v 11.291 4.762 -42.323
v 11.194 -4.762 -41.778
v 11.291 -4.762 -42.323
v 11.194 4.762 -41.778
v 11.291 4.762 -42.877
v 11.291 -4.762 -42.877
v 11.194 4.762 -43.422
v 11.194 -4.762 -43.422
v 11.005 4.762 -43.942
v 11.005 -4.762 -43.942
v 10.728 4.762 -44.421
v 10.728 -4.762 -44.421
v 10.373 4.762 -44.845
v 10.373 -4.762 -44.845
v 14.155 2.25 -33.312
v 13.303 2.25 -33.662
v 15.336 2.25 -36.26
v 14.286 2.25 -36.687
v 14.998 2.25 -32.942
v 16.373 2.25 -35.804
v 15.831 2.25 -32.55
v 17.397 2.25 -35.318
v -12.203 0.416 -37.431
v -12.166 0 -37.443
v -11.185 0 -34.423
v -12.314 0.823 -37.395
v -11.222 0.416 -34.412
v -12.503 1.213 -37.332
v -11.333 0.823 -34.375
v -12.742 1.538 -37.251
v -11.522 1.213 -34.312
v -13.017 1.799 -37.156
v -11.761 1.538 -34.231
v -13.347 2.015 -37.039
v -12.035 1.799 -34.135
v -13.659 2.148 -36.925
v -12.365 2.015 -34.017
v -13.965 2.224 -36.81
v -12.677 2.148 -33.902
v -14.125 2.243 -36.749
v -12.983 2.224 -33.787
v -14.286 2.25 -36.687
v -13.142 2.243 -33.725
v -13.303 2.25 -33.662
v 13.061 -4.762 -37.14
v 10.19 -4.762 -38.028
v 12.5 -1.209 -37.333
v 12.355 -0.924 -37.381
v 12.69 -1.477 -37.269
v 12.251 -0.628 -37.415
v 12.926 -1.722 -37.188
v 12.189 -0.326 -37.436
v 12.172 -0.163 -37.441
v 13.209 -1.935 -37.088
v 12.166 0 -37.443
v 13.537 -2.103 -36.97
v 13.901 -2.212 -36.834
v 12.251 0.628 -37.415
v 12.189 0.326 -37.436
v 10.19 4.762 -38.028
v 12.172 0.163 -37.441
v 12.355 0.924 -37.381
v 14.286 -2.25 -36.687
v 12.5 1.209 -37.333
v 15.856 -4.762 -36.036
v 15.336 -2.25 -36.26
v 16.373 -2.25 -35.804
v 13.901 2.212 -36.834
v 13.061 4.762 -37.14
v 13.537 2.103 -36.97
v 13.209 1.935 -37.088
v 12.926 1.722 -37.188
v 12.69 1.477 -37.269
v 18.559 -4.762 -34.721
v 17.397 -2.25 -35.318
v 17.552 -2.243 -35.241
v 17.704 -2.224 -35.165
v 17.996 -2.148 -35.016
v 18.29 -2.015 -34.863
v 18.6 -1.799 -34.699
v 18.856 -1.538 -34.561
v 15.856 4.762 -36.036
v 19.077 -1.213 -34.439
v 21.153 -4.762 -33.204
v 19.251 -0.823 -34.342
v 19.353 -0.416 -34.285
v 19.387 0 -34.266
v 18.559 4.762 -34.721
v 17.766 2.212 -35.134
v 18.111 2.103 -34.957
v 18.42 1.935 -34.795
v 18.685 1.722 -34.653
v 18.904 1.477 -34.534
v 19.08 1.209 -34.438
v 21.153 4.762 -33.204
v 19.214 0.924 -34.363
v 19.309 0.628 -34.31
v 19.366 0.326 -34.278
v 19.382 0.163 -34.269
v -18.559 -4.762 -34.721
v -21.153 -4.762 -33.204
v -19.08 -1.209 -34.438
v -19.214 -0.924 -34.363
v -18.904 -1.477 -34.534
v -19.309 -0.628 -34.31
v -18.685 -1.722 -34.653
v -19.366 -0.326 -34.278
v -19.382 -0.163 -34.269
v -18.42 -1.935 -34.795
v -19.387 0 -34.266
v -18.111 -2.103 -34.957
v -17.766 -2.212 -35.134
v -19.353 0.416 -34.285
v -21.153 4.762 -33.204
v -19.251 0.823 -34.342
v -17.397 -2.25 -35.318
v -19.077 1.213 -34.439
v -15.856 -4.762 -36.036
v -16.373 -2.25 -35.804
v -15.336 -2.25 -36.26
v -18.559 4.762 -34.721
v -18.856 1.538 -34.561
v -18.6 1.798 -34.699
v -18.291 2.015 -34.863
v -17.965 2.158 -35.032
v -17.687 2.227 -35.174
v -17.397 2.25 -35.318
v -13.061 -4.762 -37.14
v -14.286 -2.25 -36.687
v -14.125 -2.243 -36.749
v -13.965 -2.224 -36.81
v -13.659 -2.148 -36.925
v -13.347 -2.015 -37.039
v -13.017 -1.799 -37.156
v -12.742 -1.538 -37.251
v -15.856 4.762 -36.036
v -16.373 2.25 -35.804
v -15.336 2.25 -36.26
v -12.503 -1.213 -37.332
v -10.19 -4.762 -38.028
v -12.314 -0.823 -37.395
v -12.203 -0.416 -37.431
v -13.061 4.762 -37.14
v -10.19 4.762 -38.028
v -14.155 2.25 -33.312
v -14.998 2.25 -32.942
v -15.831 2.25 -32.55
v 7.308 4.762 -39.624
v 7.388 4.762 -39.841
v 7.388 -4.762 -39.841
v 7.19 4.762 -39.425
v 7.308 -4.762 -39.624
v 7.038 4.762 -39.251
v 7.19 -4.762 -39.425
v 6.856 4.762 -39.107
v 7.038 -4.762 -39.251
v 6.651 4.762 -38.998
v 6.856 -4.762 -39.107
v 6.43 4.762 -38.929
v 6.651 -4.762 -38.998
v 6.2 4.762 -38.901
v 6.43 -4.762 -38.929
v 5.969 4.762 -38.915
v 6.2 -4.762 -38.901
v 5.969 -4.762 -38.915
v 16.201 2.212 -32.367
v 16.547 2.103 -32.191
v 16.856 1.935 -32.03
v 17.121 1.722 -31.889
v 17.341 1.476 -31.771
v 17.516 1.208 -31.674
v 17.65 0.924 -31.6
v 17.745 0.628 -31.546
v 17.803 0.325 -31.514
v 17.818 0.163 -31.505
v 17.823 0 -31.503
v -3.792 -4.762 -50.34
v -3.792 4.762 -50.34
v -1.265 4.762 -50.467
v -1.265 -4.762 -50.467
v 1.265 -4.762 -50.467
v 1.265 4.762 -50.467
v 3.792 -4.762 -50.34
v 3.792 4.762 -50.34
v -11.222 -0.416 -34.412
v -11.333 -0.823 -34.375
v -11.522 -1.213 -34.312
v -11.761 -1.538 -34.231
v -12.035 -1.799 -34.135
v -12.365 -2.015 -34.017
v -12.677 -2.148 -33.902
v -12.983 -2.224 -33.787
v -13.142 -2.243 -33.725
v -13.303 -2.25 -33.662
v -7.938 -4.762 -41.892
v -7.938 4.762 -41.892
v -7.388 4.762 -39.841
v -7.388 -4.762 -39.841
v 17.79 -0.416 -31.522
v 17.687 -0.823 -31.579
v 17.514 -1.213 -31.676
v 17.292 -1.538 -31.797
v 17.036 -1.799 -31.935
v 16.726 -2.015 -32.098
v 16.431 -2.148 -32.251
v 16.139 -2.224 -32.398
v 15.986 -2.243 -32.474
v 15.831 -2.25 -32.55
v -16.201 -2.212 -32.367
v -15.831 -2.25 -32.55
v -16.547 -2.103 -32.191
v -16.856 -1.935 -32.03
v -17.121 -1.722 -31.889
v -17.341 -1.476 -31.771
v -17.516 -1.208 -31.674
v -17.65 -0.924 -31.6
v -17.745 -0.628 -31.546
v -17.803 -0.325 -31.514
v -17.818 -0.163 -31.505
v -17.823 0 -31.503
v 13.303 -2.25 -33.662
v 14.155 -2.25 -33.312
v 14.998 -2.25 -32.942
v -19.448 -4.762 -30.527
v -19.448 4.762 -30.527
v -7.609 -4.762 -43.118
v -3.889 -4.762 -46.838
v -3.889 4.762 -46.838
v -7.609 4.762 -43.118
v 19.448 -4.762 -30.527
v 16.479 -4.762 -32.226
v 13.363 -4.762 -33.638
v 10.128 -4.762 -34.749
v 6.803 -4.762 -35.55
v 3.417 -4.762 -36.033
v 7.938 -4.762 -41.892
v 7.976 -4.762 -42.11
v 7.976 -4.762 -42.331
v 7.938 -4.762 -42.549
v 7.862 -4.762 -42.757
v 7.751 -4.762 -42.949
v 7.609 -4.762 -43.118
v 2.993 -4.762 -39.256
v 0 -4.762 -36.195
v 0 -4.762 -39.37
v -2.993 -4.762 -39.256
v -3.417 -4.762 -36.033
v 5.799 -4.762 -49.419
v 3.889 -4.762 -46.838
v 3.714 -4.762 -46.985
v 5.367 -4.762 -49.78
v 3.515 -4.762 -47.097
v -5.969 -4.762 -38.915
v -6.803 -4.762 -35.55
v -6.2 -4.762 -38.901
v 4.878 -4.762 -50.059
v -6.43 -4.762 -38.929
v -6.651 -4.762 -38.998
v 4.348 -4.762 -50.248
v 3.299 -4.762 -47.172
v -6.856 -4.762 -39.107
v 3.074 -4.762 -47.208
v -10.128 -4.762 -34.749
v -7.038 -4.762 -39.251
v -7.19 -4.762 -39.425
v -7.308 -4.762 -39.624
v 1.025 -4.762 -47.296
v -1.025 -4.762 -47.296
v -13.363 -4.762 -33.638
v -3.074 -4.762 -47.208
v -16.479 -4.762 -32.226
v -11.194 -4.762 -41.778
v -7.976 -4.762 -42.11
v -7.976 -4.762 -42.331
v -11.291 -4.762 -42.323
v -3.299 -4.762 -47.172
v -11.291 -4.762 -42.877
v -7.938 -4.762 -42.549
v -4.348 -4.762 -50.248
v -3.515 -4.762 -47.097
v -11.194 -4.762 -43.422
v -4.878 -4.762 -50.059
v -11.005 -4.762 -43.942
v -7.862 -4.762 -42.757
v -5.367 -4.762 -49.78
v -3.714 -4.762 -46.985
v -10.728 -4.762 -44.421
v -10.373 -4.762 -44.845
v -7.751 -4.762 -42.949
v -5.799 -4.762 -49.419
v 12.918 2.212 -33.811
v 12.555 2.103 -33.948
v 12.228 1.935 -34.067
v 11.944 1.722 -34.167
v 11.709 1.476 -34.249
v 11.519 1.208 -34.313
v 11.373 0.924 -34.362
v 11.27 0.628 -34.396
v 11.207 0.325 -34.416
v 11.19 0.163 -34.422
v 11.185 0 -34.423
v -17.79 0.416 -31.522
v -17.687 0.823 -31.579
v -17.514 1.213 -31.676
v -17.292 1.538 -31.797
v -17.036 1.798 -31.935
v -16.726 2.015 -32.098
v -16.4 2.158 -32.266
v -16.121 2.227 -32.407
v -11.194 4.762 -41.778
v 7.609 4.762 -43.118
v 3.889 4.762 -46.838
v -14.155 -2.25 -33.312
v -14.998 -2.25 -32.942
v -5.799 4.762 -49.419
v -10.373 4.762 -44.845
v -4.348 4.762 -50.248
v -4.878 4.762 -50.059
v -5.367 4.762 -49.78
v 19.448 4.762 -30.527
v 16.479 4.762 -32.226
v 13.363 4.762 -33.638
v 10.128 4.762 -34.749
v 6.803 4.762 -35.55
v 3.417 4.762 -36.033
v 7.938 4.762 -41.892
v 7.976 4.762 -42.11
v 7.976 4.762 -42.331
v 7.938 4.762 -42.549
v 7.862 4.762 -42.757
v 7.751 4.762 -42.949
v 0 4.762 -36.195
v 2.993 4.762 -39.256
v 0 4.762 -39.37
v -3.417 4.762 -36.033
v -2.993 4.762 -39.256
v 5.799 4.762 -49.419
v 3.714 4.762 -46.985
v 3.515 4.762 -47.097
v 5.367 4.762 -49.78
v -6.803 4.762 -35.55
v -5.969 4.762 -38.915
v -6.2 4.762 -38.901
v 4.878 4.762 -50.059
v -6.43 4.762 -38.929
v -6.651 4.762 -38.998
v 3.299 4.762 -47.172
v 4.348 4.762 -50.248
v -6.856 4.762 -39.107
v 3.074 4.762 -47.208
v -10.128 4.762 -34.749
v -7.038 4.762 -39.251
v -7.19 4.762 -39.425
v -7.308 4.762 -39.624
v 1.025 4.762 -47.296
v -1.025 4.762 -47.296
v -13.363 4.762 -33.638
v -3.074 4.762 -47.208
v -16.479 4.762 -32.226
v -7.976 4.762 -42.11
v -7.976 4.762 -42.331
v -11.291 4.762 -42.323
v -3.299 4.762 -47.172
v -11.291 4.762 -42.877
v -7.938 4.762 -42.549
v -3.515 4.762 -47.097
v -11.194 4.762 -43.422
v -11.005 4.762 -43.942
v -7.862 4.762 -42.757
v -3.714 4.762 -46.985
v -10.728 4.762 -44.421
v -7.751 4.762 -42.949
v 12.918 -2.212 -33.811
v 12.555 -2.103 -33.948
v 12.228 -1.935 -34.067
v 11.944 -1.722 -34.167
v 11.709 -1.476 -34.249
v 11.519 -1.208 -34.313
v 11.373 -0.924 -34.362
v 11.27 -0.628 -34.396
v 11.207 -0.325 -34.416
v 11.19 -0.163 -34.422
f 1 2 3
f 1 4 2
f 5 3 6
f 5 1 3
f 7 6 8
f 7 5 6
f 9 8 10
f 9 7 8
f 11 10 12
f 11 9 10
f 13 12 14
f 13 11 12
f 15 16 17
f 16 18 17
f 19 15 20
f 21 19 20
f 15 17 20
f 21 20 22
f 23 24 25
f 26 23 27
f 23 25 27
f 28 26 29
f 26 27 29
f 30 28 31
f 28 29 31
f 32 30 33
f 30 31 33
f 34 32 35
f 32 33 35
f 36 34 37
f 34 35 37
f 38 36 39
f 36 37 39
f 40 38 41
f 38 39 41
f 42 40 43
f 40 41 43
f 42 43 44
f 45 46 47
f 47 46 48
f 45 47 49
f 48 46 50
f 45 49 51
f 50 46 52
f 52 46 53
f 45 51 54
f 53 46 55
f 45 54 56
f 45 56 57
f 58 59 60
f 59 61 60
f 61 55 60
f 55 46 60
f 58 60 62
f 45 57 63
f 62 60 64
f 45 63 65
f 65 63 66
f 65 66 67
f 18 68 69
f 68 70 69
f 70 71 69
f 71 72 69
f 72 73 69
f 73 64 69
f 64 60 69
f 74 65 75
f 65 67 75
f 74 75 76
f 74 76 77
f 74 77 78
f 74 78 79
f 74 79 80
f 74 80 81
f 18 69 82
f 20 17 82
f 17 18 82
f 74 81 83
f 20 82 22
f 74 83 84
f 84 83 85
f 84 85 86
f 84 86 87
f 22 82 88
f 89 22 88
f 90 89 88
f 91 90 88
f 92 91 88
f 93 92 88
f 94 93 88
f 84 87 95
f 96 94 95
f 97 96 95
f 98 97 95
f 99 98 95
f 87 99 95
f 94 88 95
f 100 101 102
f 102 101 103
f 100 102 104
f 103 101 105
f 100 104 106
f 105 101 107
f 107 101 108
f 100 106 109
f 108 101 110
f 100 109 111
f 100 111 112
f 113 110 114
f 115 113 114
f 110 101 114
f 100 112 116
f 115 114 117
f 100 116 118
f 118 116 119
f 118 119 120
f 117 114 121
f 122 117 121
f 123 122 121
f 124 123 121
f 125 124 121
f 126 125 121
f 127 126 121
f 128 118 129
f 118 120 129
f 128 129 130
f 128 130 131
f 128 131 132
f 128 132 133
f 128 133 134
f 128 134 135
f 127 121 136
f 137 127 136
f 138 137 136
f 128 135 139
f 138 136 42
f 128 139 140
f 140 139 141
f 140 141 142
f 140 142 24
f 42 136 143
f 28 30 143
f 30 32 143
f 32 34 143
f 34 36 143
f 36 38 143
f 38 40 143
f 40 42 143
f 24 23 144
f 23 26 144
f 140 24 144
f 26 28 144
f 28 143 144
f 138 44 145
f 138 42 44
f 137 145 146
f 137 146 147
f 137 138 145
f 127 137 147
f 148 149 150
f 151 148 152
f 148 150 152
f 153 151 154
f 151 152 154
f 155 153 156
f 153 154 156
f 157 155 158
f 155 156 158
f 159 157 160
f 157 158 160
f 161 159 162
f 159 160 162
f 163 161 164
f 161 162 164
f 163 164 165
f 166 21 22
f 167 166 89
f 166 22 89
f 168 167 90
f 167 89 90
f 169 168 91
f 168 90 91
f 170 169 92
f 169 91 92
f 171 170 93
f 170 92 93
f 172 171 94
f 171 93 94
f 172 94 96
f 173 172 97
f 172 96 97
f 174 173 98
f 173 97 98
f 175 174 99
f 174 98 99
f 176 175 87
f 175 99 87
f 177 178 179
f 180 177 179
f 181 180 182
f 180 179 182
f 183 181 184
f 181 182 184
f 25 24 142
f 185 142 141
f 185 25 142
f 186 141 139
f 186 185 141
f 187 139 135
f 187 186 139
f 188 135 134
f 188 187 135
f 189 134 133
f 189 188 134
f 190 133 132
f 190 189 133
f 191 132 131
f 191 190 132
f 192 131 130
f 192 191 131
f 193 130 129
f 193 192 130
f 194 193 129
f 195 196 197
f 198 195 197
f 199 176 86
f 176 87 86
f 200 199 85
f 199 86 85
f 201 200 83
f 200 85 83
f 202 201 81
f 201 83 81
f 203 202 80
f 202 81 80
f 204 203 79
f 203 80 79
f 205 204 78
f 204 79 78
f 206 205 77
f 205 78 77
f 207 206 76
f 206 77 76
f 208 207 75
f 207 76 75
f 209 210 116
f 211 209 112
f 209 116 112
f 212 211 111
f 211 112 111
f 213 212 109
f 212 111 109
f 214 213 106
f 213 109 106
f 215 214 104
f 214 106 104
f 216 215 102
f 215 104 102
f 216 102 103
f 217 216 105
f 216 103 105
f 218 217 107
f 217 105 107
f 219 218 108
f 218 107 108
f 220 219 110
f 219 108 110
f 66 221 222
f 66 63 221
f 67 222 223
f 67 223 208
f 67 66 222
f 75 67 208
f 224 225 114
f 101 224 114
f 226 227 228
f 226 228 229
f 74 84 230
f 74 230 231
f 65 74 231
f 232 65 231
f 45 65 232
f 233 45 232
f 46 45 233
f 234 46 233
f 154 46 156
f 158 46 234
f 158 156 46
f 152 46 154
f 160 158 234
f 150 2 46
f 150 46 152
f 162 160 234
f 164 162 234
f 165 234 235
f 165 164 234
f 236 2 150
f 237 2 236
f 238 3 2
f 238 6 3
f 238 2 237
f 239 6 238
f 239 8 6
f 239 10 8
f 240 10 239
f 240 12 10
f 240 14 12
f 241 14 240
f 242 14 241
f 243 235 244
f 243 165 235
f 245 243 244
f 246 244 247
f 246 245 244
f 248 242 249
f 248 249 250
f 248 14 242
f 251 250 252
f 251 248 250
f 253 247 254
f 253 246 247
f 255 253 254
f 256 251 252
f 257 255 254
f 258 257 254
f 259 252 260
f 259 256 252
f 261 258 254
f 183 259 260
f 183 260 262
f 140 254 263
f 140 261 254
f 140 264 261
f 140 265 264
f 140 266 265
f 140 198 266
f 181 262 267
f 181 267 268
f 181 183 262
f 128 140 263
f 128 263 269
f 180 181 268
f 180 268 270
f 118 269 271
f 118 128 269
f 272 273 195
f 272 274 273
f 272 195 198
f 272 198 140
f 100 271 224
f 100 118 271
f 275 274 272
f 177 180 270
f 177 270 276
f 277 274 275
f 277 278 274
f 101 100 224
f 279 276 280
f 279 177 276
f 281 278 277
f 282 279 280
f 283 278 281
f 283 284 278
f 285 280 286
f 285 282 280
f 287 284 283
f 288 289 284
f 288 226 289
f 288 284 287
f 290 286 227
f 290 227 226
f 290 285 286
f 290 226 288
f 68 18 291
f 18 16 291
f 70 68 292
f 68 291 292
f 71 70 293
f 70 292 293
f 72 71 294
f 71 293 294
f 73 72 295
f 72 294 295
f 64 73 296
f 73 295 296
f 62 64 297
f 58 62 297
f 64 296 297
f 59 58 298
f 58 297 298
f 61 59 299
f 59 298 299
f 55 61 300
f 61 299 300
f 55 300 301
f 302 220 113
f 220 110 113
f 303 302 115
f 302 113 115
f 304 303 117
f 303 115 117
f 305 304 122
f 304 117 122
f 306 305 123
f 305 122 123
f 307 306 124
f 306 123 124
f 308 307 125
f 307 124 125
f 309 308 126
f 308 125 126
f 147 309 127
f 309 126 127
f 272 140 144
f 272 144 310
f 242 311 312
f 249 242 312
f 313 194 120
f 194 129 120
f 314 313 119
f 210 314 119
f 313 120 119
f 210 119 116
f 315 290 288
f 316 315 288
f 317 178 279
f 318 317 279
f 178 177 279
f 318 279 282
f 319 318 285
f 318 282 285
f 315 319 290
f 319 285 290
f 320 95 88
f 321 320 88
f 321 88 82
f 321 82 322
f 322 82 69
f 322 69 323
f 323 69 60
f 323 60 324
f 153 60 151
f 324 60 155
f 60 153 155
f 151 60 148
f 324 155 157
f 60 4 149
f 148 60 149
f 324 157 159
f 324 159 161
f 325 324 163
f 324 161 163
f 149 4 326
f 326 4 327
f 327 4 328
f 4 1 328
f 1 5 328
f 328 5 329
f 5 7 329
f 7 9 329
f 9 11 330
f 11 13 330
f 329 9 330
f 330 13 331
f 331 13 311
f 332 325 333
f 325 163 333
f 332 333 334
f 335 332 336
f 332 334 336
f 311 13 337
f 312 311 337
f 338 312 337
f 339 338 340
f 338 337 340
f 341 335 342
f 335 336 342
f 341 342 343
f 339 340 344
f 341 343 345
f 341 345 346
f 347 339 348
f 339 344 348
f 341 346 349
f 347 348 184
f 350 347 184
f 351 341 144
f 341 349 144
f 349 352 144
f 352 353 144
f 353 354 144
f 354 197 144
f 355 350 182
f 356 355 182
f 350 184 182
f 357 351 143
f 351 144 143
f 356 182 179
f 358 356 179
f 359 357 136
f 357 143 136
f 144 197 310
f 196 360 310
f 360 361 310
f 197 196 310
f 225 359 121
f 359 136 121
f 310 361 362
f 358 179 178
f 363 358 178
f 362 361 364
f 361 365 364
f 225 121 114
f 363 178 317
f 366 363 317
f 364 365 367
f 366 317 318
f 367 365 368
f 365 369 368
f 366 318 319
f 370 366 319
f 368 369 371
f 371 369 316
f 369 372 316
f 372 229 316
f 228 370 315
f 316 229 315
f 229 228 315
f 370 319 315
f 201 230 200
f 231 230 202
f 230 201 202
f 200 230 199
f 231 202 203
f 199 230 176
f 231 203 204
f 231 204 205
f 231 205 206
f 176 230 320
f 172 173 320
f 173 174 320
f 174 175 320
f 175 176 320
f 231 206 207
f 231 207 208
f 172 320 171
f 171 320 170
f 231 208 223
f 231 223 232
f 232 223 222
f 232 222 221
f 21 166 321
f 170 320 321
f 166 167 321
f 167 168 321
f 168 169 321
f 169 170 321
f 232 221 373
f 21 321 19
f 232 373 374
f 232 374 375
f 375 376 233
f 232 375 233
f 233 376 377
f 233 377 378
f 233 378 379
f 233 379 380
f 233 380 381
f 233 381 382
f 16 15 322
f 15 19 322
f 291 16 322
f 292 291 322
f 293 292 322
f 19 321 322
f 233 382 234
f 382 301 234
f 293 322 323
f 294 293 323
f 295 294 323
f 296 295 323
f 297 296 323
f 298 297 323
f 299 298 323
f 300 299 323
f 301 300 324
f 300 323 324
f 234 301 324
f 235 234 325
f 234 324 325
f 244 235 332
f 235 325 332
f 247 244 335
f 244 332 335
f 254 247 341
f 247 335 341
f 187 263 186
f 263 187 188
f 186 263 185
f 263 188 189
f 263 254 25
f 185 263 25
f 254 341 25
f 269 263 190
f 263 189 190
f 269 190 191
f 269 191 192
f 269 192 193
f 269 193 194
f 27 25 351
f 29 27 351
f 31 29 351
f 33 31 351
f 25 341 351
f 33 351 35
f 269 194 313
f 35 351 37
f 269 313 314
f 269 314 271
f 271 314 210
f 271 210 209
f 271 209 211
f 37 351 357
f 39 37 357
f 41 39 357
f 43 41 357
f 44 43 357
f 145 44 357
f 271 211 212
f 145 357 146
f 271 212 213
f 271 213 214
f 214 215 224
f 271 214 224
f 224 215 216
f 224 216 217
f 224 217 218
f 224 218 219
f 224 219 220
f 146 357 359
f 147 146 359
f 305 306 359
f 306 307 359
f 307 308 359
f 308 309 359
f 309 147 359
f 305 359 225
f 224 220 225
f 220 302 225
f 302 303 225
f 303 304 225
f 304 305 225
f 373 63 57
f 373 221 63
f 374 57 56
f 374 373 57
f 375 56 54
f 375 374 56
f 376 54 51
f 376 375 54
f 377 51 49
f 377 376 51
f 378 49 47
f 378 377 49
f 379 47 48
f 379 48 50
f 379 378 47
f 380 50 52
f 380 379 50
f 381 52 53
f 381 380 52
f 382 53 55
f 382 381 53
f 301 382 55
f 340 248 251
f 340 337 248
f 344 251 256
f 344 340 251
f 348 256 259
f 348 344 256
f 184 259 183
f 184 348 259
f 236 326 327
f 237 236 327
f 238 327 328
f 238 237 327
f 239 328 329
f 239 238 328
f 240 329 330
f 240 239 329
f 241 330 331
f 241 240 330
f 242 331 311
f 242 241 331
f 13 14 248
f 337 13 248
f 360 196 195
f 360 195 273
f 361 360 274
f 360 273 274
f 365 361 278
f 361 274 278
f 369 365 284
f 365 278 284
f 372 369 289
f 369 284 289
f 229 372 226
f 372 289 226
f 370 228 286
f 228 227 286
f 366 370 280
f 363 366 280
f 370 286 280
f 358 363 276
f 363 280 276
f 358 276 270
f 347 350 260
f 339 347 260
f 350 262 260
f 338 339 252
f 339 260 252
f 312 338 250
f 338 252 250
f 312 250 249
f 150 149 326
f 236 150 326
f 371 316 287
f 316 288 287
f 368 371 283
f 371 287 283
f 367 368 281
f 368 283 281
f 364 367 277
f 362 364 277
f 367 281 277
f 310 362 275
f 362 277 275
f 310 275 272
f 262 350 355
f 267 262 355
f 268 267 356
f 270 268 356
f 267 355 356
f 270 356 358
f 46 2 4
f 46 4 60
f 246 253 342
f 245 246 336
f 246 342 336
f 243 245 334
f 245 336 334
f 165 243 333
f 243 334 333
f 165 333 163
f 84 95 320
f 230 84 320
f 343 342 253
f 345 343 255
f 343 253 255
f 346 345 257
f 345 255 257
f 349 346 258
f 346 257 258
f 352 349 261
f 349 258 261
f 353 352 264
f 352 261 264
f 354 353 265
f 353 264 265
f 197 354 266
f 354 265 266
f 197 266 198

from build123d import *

# Parameters (mm, degrees)
BOSS_EXTRUDE1_DEPTH  = 4.7625
CHAMFER1_SIZE        = 5.3975
CUT_EXTRUDE1_DEPTH   = 2.25
FILLET1_R            = 2.25
FILLET1_OF_MIRROR1_R = 2.25
FILLET2_R            = 3.175
CUT_EXTRUDE2_DEPTH   = 56.557883235
FILLET3_R            = 1.27


# Some blends are built 0.0001 mm under size
with BuildPart() as part:
    # Sketch1 → Boss-Extrude1 (new, symmetric)
    with BuildSketch(Plane(origin=(0, 0, 0), x_dir=(1, 0, 0), z_dir=(0, 1, 0))):
        with BuildLine():
            Line((-19.447559324, 30.526553381), (-21.153485581, 33.204321222))
            ThreePointArc((-21.153485581, 33.204321222), (-15.85613718, 36.035812933), (-10.189705806, 38.028499781))
            Line((-10.189705806, 38.028499781), (-13.065832444, 48.762350526))
            ThreePointArc((-13.065832444, 48.762350526), (0, 50.4825), (13.065832444, 48.762350526))
            Line((13.065832444, 48.762350526), (10.189705806, 38.028499781))
            ThreePointArc((10.189705806, 38.028499781), (15.85613718, 36.035812933), (21.153485581, 33.204321222))
            Line((21.153485581, 33.204321222), (19.447559324, 30.526553381))
            ThreePointArc((19.447559324, 30.526553381), (0, 36.195), (-19.447559324, 30.526553381))
        make_face()
    extrude(amount=BOSS_EXTRUDE1_DEPTH, both=True)

    # Chamfer1
    # the kernel refuses this chamfer: 9.348744234, 5.3975 mm, written as the material it takes off along each edge
    with BuildSketch(Plane(origin=(-13.065832444, 26.081931668, -48.762350526), x_dir=(0.9837865219812311, 0, -0.17934346703482887), z_dir=(0, -1, 0))) as chamfer1_piece_1:
        with BuildLine():
            Line((8.217561706, 0), (CHAMFER1_SIZE * 0.0813902016187, CHAMFER1_SIZE * 0.99668231402))
            Line((CHAMFER1_SIZE * 0.0813902016187, CHAMFER1_SIZE * 0.99668231402), (0, 0))
            ThreePointArc((0, 0), (4.262745394, -0.167250297), (8.217561706, 0))
        make_face()
    extrude(amount=52.163863336, mode=Mode.SUBTRACT)
    with BuildSketch(Plane(origin=(13.065832444, -26.081931668, -48.762350526), x_dir=(-0.25881904510252207, 0, 0.965925826289068), z_dir=(0, 1, 0))) as chamfer1_piece_2:
        with BuildLine():
            Line((CHAMFER1_SIZE, 0), (0.668829004, -8.190298417))
            ThreePointArc((0.668829004, -8.190298417), (0.180250294, -4.262215479), (0, 0))
            Line((0, 0), (CHAMFER1_SIZE, 0))
        make_face()
    extrude(amount=52.163863336, mode=Mode.SUBTRACT)

    # Sketch2 → Cut-Extrude1 (cut, symmetric)
    with BuildSketch(Plane(origin=(0, 0, 0), x_dir=(1, 0, 0), z_dir=(0, 1, 0))):
        with BuildLine():
            Line((-12.165999069, 37.443095047), (-11.184870111, 34.423490607))
            ThreePointArc((-11.184870111, 34.423490607), (-14.577416439, 33.129698987), (-17.823270758, 31.502524415))
            Line((-17.823270758, 31.502524415), (-19.386715561, 34.265903749))
            ThreePointArc((-19.386715561, 34.265903749), (-15.85613718, 36.035812933), (-12.165999069, 37.443095047))
        make_face()
    cut_extrude1 = extrude(amount=CUT_EXTRUDE1_DEPTH, both=True, mode=Mode.SUBTRACT)

    # Fillet1
    fillet1_edges = [part.edges().sort_by_distance(p)[0] for p in [
        (-18.60499316, -2.25, -32.884214082),
        (-18.60499316, 2.25, -32.884214082),
        (-11.67543459, 2.25, -35.933292827),
        (-11.67543459, -2.25, -35.933292827),
    ]]
    fillet(fillet1_edges, radius=FILLET1_R - 0.0001)  # a hair under: the kernel refuses the full size

    # Mirror1: Cut-Extrude1 across plane
    add(cut_extrude1.mirror(Plane(origin=(0, 0, 0), x_dir=(0, 0, 1), z_dir=(1, 0, 0))), mode=Mode.SUBTRACT)

    # Fillet1 of Mirror1
    fillet1_of_mirror1_edges = [part.edges().sort_by_distance(p)[0] for p in [
        (18.60499316, -2.25, -32.884214082),
        (18.60499316, 2.25, -32.884214082),
        (11.67543459, 2.25, -35.933292827),
        (11.67543459, -2.25, -35.933292827),
    ]]
    fillet(fillet1_of_mirror1_edges, radius=FILLET1_OF_MIRROR1_R - 0.0001)  # a hair under: the kernel refuses the full size

    # Fillet2
    fillet2_edges = [part.edges().sort_by_distance(p)[0] for p in [
        (-11.668856648, 0, -43.548765878),
        (4.981505994, 0, -50.236116533),
        (-4.981505994, 0, -50.236116533),
        (11.668856648, 0, -43.548765878),
    ]]
    fillet(fillet2_edges, radius=FILLET2_R)

    # Sketch3 → Cut-Extrude2 (cut, through all)
    with BuildSketch(Plane(origin=(0, 4.7625, 0), x_dir=(1, 0, 0), z_dir=(0, 1, 0))):
        with BuildLine():
            Line((7.089702157, 38.726386655), (8.127604296, 42.59989017))
            Line((8.127604296, 42.59989017), (3.553655431, 47.173839035))
            ThreePointArc((3.553655431, 47.173839035), (0, 47.3075), (-3.553655431, 47.173839035))
            Line((-3.553655431, 47.173839035), (-8.127604296, 42.59989017))
            Line((-8.127604296, 42.59989017), (-7.089702157, 38.726386655))
            ThreePointArc((-7.089702157, 38.726386655), (0, 39.37), (7.089702157, 38.726386655))
        make_face()
    extrude(amount=-CUT_EXTRUDE2_DEPTH, mode=Mode.SUBTRACT)

    # Fillet3
    fillet3_edges = [part.edges().sort_by_distance(p)[0] for p in [
        (7.089702157, 0, -38.726386655),
        (-7.089702157, 0, -38.726386655),
        (-8.127604296, 0, -42.59989017),
        (-3.553655431, 0, -47.173839035),
        (3.553655431, 0, -47.173839035),
        (8.127604296, 0, -42.59989017),
    ]]
    fillet(fillet3_edges, radius=FILLET3_R)


solid = part.part
